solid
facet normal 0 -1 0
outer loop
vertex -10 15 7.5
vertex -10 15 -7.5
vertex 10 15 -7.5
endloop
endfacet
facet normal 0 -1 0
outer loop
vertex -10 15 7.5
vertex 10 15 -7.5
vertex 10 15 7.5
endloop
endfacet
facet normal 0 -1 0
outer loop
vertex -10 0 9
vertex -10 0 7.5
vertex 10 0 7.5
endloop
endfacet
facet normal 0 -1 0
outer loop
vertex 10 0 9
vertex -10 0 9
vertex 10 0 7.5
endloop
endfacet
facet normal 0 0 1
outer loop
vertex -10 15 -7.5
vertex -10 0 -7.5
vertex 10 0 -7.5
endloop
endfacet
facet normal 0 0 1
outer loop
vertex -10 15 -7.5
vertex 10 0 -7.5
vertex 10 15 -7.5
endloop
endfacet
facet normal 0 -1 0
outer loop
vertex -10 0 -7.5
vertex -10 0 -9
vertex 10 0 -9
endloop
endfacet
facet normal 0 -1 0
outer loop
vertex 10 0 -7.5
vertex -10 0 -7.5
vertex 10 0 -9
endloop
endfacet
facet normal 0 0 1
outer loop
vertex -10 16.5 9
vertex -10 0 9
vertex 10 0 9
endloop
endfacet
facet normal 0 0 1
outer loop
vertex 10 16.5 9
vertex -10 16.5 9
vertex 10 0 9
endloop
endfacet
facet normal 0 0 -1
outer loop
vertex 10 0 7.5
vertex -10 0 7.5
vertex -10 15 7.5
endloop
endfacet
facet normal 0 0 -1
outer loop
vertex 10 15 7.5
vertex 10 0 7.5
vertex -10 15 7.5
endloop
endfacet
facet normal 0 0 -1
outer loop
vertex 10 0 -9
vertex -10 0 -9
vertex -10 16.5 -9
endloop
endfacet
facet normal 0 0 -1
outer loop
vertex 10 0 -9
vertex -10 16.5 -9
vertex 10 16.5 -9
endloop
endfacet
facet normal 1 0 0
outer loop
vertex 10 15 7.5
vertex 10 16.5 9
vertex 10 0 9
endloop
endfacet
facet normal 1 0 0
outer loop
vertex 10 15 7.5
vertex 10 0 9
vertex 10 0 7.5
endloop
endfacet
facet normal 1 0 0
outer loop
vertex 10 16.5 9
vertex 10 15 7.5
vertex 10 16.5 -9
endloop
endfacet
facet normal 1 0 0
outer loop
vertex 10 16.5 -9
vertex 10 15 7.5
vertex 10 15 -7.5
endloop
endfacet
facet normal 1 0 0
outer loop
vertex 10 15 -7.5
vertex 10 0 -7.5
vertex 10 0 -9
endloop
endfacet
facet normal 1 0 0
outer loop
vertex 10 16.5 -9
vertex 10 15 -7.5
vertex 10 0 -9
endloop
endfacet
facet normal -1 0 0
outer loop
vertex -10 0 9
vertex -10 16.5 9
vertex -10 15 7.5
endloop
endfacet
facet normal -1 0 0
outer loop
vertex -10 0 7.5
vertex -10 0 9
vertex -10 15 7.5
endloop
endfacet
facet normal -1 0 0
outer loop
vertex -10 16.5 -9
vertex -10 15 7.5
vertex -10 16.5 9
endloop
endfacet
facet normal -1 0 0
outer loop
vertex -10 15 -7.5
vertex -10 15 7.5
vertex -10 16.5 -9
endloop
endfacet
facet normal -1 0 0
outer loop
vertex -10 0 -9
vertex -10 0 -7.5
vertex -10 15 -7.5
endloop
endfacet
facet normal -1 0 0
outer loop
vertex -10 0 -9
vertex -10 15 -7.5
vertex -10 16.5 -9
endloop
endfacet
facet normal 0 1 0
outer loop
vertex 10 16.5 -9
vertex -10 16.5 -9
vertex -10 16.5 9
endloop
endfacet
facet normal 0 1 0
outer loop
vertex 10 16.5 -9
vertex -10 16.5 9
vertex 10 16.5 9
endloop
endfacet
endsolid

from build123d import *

# Parameters (mm, degrees)
SKETCH1_W           = 20
SKETCH1_H           = 18
BOSS_EXTRUDE1_DEPTH = 16.5
CUT_EXTRUDE1_REACH  = 22
SKETCH2_W           = 15
SKETCH2_H           = 15


with BuildPart() as part:
    # Sketch1 → Boss-Extrude1 (new body)
    with BuildSketch(Plane(origin=(0, 0, 0), x_dir=(1, 0, 0), z_dir=(0, 1, 0))):
        Rectangle(SKETCH1_W, SKETCH1_H)
    extrude(amount=BOSS_EXTRUDE1_DEPTH)

    # Sketch2 → Cut-Extrude1 (cut, up to next)
    with BuildSketch(Plane.ZY.offset(10), mode=Mode.PRIVATE) as cut_extrude1_sk1:
        with Locations((0, 7.5)):
            Rectangle(SKETCH2_W, SKETCH2_H)
    cut_extrude1_tool1 = extrude(cut_extrude1_sk1.sketch, amount=-CUT_EXTRUDE1_REACH, mode=Mode.PRIVATE) & part.part
    add(cut_extrude1_tool1.solids().sort_by_distance((-10, 7.5, 0))[0], mode=Mode.SUBTRACT)


solid = part.part
